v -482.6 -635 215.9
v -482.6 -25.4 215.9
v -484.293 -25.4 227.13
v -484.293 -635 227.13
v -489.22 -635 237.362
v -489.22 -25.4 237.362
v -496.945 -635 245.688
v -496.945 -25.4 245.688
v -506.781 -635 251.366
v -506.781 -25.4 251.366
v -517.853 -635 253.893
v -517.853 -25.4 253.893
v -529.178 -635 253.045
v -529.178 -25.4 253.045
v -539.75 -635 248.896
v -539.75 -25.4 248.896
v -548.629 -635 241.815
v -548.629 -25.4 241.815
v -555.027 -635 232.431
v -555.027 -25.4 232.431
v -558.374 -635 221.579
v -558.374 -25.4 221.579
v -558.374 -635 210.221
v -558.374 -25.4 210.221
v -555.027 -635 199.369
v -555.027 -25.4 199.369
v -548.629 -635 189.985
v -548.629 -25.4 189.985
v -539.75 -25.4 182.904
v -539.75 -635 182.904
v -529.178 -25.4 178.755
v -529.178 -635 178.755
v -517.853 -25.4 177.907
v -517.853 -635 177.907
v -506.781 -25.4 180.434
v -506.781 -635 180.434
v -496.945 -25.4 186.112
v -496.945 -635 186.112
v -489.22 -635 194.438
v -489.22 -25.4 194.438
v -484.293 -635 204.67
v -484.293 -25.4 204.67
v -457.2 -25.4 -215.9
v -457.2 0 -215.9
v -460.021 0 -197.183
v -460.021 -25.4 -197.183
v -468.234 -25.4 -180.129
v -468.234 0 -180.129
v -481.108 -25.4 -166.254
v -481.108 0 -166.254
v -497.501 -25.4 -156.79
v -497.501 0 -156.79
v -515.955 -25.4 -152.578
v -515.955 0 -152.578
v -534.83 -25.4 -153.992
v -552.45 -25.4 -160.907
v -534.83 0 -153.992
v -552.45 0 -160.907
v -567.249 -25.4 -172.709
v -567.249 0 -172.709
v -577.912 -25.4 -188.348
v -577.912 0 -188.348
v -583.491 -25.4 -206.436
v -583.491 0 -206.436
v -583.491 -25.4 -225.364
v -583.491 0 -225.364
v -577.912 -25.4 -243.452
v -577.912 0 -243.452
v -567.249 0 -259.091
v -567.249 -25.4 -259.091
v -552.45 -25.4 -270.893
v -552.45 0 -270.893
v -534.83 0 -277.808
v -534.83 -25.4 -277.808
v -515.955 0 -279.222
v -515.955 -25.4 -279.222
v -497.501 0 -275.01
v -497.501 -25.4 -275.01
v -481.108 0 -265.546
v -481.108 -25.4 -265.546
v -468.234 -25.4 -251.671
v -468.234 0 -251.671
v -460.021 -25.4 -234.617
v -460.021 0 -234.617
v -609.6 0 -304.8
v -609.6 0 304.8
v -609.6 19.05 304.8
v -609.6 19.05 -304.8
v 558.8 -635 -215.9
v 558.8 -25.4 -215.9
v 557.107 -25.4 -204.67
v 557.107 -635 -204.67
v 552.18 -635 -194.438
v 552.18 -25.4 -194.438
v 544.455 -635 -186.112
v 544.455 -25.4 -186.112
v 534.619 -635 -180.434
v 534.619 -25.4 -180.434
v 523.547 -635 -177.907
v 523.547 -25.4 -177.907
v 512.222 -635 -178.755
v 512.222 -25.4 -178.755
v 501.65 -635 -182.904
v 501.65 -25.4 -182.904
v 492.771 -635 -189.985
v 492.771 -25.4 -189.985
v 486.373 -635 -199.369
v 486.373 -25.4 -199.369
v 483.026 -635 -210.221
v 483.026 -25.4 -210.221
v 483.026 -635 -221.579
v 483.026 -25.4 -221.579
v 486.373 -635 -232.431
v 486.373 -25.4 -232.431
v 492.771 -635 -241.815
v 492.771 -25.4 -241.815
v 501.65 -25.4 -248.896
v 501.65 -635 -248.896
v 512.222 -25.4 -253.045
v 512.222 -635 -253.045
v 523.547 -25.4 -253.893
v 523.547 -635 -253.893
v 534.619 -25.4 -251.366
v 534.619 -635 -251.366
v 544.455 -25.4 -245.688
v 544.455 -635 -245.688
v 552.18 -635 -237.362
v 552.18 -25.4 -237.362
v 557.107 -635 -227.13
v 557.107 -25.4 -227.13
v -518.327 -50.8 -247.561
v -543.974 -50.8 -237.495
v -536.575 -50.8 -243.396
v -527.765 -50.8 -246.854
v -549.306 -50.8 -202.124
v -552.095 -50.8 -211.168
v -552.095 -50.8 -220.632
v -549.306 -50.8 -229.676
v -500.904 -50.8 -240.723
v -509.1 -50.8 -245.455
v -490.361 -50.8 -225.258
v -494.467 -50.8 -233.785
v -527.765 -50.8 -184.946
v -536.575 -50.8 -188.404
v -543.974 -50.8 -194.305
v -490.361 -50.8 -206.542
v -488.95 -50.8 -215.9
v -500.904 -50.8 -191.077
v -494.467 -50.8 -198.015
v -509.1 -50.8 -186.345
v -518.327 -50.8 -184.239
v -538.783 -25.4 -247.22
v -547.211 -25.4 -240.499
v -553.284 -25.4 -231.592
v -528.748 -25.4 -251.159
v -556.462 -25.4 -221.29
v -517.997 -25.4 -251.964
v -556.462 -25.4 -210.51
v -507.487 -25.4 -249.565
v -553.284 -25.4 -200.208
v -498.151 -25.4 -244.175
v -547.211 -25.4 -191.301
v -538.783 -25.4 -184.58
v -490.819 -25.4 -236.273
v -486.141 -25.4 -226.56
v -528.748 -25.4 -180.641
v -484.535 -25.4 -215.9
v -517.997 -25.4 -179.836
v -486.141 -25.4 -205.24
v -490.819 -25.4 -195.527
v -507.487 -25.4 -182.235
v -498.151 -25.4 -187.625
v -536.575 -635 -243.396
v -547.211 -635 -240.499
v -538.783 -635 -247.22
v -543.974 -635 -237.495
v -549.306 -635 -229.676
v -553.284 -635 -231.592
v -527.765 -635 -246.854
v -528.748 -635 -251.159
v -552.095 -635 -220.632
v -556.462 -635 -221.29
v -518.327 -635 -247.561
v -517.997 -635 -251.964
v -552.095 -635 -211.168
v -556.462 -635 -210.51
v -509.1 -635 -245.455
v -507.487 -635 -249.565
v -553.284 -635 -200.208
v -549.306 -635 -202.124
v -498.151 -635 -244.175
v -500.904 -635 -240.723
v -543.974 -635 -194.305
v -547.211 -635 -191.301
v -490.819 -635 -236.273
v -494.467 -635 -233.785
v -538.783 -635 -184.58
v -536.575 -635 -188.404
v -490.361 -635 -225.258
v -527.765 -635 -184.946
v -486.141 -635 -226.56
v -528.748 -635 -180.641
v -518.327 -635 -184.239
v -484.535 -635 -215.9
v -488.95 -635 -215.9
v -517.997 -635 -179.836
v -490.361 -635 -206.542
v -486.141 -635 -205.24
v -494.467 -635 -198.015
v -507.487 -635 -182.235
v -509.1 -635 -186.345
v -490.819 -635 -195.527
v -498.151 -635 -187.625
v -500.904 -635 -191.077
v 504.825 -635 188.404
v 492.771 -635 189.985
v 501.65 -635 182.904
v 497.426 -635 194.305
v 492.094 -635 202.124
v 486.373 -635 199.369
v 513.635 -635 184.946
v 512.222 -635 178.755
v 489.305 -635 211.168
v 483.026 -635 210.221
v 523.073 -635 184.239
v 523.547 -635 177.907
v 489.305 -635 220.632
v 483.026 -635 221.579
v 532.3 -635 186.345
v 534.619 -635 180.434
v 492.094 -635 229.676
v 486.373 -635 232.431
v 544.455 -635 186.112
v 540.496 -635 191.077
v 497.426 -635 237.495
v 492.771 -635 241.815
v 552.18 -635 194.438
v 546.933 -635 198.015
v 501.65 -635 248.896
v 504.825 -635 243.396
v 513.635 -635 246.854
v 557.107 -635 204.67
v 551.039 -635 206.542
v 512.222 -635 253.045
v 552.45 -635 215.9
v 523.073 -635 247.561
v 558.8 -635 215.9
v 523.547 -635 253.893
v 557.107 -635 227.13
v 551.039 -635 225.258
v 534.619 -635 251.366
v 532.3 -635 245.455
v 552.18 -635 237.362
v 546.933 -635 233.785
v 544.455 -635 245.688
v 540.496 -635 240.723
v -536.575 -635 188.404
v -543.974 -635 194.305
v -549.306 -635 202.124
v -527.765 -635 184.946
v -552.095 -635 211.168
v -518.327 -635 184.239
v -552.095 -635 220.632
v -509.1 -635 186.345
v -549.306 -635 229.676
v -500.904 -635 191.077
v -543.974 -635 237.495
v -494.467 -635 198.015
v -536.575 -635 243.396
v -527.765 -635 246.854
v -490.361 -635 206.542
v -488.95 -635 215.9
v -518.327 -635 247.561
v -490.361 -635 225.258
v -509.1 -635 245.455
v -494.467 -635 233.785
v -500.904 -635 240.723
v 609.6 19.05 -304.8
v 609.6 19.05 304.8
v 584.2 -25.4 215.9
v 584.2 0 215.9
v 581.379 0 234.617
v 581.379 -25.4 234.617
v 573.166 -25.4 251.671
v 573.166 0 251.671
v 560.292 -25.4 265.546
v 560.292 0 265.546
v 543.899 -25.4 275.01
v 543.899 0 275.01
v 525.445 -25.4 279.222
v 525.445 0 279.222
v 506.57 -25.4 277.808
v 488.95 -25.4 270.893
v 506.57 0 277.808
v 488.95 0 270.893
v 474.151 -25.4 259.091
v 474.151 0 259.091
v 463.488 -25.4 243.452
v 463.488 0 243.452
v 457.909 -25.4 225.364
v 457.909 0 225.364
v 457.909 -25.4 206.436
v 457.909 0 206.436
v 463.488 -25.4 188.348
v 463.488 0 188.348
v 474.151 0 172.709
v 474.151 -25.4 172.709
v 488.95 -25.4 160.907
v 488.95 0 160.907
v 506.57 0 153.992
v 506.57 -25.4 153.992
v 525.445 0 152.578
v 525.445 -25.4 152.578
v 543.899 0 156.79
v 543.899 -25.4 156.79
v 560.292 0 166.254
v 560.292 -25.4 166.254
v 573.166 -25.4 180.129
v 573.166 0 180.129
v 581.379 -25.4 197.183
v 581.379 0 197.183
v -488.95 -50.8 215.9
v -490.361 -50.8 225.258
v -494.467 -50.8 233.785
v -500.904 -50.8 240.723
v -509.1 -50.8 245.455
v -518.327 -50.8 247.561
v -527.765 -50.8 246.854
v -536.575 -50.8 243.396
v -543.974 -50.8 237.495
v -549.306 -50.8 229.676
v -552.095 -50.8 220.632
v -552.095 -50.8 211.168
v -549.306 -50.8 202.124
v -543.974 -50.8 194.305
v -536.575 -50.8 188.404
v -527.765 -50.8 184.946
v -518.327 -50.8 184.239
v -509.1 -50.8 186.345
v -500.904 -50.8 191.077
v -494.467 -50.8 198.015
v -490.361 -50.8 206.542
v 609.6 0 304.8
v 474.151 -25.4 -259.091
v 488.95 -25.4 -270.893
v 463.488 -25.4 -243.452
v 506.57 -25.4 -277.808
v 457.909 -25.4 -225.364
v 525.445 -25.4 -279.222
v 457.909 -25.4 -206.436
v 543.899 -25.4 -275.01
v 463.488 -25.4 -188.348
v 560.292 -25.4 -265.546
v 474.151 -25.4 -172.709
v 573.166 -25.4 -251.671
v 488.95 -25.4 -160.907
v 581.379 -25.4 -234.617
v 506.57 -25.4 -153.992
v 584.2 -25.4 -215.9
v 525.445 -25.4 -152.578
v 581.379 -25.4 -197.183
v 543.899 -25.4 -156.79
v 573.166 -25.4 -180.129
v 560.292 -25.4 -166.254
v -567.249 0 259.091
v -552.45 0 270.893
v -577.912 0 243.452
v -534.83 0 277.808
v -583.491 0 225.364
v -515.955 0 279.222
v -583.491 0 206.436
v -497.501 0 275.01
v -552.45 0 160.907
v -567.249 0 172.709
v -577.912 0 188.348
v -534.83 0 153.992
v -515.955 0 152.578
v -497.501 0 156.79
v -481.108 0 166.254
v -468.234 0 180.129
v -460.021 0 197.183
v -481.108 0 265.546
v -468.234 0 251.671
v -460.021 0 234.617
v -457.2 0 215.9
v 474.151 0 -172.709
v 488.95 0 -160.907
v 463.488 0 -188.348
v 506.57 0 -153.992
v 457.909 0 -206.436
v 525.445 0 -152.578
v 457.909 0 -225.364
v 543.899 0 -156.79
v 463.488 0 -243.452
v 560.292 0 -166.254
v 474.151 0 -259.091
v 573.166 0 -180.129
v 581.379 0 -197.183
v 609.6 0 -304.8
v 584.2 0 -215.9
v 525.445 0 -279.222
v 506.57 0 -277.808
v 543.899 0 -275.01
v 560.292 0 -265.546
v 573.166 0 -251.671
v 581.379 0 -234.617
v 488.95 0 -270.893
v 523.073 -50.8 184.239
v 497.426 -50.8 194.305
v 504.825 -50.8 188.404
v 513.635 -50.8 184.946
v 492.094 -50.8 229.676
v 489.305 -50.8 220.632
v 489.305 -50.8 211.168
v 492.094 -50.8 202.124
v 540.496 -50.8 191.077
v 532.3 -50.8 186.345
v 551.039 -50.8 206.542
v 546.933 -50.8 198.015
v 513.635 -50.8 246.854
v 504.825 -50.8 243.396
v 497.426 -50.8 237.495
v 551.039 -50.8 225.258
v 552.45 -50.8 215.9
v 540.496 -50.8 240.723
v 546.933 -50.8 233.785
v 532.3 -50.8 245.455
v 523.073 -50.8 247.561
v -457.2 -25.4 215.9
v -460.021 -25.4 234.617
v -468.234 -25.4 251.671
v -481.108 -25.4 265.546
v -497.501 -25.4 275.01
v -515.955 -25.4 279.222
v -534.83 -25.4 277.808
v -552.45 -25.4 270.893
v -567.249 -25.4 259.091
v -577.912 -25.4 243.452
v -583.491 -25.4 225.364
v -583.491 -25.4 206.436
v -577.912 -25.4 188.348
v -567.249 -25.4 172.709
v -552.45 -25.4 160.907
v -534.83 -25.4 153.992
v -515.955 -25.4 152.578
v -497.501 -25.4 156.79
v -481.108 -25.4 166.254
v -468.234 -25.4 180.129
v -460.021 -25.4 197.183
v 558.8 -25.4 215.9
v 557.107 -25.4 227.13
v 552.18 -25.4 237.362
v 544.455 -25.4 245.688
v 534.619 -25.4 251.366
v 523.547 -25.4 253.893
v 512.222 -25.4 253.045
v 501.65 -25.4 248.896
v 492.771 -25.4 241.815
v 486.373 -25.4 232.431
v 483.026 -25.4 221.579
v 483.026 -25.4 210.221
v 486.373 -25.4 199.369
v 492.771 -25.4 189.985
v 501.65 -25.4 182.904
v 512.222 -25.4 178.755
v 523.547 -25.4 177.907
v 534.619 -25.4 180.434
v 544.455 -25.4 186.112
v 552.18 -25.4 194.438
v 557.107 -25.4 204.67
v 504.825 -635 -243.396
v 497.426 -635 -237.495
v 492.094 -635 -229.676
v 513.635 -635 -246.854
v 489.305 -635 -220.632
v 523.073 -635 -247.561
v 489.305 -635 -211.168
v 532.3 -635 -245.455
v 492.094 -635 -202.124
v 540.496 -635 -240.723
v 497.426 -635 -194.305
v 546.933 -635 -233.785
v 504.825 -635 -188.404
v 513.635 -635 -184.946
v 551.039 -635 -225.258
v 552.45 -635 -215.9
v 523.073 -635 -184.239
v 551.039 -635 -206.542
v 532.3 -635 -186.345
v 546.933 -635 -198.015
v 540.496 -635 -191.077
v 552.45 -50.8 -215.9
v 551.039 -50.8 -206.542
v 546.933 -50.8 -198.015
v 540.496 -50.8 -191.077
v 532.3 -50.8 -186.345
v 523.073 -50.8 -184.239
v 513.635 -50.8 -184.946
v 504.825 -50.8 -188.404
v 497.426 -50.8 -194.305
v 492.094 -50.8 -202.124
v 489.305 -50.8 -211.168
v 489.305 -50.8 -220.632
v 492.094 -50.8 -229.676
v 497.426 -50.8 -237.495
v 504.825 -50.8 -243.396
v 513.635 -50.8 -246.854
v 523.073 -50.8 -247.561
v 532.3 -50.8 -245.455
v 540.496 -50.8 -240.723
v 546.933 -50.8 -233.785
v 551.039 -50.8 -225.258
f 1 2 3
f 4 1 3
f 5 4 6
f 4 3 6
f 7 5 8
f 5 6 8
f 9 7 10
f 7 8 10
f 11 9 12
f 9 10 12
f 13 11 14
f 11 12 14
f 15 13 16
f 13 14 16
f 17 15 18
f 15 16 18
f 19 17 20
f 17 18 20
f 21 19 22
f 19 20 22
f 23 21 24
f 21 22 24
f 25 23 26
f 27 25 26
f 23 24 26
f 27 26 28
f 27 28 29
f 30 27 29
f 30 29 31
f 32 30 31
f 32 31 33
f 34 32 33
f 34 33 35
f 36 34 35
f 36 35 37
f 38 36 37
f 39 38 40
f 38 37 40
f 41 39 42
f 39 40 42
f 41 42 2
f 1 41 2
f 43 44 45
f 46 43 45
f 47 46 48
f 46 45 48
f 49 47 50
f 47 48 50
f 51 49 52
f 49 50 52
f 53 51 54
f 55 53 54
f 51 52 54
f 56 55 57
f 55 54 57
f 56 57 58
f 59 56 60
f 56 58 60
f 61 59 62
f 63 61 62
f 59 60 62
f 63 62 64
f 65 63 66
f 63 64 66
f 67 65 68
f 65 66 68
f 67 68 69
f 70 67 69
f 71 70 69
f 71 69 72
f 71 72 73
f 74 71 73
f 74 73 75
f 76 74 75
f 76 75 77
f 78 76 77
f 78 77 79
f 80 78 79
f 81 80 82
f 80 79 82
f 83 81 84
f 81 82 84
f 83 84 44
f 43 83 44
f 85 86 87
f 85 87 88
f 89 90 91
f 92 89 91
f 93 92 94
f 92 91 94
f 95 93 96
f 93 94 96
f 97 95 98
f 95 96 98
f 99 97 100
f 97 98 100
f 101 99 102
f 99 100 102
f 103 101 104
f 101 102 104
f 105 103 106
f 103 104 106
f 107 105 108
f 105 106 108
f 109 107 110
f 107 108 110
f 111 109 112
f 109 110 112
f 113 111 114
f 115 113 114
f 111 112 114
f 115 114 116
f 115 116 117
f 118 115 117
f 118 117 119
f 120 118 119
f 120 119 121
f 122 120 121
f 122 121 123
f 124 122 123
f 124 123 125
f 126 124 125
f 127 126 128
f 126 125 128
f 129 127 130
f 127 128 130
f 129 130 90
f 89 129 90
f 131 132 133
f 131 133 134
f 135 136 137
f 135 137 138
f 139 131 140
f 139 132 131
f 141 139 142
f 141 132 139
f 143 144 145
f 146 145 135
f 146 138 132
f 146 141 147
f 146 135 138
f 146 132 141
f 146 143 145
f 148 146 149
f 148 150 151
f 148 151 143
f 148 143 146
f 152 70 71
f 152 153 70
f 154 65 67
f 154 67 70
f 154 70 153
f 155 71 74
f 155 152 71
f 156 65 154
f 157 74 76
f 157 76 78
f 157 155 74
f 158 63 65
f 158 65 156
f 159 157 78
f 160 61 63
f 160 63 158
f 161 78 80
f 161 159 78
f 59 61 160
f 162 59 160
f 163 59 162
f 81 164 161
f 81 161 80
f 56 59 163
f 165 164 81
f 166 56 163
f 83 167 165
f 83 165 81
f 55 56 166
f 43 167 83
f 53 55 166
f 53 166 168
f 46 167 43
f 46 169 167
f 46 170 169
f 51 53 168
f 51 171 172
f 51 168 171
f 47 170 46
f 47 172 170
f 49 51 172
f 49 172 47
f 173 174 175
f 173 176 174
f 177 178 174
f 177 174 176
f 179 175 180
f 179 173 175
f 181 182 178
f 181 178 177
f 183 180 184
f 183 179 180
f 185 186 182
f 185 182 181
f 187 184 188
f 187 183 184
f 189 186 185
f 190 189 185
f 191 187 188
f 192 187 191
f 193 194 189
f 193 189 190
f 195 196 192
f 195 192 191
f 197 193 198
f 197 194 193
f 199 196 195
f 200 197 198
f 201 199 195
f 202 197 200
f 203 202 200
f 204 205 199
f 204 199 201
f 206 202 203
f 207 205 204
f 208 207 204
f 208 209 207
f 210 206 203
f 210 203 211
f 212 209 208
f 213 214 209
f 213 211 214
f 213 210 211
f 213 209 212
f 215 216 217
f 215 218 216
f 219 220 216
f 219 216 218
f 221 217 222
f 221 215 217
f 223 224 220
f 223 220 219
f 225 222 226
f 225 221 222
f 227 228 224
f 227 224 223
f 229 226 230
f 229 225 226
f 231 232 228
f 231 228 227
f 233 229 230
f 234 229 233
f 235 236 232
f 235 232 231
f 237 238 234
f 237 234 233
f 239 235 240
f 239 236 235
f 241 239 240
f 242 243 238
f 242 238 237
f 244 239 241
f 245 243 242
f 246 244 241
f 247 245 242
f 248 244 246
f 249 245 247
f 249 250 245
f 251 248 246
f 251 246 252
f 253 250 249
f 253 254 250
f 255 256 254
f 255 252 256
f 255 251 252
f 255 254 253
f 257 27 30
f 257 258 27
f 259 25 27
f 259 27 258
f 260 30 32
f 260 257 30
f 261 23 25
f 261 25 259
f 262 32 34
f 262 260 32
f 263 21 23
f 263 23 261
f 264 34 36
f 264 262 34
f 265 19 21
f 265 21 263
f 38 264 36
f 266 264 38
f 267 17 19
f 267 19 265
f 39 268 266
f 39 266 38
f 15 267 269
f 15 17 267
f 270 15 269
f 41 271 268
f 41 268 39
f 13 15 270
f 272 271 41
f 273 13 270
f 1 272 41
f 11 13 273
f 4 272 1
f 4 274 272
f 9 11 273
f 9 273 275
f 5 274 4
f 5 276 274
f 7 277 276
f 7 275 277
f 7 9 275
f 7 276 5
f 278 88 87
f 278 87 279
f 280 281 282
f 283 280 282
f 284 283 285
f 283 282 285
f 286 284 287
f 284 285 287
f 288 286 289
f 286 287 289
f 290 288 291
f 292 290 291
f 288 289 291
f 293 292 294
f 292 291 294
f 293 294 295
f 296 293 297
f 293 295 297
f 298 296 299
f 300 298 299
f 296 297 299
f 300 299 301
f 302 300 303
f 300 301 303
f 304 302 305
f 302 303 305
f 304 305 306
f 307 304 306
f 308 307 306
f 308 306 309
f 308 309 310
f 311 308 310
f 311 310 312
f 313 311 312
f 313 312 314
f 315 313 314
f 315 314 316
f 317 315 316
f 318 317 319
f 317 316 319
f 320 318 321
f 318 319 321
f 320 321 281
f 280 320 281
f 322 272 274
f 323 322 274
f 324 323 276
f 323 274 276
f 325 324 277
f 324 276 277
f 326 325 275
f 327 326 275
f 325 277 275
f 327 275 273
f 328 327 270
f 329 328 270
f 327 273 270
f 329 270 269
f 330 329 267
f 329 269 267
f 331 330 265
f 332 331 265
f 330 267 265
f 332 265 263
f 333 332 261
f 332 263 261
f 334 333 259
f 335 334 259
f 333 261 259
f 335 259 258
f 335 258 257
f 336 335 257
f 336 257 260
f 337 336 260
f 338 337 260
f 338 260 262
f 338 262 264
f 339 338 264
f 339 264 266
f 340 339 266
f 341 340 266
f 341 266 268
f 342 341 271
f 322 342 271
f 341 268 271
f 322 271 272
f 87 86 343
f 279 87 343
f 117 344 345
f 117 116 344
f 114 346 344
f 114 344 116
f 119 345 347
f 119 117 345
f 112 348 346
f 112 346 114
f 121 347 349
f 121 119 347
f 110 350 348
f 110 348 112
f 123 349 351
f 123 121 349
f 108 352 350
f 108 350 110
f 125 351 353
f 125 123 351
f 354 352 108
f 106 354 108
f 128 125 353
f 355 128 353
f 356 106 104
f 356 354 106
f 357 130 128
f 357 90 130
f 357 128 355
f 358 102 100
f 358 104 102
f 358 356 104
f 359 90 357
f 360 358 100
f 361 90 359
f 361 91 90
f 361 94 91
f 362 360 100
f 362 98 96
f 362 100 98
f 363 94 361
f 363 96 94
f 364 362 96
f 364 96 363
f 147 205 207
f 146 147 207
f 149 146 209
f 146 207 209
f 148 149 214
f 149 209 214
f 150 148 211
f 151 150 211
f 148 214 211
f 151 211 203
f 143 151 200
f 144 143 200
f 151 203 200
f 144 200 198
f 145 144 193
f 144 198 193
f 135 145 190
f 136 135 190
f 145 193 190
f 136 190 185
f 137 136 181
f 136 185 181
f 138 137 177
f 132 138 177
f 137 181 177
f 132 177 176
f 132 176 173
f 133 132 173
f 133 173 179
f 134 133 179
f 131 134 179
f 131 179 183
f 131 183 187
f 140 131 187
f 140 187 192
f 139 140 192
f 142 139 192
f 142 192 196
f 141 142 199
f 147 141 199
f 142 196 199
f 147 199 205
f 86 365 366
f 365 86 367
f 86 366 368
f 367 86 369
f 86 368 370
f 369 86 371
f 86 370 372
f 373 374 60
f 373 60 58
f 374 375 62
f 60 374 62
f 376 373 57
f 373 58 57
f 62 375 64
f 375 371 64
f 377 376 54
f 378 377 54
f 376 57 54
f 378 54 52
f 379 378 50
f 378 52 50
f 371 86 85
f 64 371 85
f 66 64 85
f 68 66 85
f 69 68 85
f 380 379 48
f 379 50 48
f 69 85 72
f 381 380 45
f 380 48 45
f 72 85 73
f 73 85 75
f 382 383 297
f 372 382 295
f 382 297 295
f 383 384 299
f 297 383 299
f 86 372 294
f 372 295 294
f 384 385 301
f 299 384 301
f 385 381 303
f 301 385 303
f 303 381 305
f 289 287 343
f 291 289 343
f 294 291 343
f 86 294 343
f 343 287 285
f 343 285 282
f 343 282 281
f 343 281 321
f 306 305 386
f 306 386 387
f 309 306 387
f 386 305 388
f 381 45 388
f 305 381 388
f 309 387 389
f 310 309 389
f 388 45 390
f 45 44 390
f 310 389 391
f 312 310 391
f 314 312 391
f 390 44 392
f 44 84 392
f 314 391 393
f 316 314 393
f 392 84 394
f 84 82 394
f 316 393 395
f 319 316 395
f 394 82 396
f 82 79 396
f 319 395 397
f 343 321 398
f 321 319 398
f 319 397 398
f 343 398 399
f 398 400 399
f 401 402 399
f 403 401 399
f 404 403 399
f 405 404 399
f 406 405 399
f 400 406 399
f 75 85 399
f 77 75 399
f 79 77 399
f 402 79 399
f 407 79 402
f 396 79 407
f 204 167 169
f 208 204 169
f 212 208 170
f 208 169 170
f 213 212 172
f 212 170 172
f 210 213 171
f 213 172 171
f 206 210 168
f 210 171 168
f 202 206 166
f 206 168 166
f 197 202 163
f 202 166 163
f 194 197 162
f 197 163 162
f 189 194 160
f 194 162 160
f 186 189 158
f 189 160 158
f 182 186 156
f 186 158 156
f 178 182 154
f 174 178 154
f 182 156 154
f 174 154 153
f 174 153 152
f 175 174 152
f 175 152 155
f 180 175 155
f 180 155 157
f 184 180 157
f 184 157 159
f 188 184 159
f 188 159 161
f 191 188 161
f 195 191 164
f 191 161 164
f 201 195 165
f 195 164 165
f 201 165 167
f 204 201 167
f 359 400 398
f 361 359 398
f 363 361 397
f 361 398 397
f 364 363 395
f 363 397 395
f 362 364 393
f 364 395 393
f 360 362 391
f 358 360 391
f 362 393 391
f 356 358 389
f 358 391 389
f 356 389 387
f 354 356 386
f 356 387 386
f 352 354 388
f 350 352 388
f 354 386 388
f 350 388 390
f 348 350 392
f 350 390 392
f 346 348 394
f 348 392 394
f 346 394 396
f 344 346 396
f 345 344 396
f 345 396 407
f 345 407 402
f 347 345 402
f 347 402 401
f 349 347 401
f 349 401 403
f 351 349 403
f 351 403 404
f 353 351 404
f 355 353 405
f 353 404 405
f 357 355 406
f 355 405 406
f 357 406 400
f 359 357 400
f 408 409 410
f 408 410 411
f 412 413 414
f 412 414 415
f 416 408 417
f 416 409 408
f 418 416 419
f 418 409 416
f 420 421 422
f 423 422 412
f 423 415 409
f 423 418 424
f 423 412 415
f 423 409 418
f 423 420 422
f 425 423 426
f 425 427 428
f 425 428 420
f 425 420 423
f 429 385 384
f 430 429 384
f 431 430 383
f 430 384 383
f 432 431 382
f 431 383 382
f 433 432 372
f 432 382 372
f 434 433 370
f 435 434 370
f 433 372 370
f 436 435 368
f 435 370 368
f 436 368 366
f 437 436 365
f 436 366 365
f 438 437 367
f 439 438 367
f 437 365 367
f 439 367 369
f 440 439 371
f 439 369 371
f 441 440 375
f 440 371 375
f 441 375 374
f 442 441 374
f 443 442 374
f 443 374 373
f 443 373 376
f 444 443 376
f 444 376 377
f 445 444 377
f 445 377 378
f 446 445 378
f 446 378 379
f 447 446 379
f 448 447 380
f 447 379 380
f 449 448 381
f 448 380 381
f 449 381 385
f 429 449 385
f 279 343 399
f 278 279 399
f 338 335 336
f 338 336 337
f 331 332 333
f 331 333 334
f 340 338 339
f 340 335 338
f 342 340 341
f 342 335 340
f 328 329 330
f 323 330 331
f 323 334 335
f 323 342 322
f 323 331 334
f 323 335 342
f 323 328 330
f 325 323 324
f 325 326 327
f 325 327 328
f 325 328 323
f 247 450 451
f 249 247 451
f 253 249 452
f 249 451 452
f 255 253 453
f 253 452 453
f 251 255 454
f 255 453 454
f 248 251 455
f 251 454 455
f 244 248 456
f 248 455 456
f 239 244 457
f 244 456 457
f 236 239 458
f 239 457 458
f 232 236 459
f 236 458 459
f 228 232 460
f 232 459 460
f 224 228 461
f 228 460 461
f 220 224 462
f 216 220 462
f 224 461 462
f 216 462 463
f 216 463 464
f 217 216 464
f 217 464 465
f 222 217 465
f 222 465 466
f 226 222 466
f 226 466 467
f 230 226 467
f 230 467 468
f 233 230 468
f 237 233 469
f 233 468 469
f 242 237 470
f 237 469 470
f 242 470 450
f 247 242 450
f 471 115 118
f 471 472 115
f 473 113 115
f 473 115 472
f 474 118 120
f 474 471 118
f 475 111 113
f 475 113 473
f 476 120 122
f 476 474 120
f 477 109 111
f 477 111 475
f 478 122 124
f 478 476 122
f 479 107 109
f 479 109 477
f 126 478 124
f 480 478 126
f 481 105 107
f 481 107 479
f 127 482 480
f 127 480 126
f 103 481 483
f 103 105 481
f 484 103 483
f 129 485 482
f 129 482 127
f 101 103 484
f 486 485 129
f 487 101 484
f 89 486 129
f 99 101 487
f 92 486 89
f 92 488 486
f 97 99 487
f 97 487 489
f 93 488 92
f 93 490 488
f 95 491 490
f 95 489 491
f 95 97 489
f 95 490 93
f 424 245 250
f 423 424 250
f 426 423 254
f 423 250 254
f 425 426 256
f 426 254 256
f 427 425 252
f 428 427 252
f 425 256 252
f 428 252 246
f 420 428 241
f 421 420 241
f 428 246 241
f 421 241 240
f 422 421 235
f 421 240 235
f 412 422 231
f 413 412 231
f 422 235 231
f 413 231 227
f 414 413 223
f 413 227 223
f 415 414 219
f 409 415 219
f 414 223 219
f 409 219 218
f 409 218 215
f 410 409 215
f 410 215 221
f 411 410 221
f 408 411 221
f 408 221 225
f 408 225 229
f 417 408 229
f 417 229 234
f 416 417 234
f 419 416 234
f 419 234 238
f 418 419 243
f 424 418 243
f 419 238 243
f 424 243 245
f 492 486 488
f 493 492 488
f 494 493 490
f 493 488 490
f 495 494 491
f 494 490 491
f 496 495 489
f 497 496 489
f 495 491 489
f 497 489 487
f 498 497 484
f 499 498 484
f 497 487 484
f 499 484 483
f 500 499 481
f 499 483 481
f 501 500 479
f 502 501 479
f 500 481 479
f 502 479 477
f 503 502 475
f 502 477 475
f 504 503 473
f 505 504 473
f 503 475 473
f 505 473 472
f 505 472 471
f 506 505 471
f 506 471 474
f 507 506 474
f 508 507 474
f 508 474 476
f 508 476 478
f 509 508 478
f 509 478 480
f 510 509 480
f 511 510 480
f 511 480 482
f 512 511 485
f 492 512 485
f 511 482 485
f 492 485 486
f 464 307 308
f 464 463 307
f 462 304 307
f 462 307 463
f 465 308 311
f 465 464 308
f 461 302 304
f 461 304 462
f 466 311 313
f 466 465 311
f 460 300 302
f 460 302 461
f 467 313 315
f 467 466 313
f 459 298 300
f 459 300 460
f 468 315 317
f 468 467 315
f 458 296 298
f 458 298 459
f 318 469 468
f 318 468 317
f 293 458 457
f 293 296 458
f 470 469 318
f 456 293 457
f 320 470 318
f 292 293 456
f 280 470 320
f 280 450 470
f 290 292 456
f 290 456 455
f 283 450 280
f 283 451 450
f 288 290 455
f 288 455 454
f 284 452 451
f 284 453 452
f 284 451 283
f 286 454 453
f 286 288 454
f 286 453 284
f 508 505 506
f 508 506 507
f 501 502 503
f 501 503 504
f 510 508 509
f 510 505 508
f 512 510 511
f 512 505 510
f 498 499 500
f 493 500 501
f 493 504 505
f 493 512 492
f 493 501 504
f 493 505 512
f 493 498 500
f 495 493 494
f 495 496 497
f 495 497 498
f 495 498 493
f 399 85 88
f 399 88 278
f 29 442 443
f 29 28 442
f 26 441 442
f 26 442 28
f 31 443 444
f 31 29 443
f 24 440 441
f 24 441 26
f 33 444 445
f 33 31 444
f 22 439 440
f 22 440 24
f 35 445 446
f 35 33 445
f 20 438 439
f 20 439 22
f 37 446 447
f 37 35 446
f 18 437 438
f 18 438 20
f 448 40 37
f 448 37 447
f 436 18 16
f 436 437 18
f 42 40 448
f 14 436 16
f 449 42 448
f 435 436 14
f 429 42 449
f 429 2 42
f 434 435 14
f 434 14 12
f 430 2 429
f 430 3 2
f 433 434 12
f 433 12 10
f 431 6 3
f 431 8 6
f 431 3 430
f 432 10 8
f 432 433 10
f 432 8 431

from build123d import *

# Parameters (mm, degrees)
SKETCH1_W           = 1219.2
SKETCH1_H           = 609.6
BOSS_EXTRUDE1_DEPTH = 19.05
SKETCH2_R           = 63.5
BOSS_EXTRUDE2_DEPTH = 25.4
SKETCH3_R           = 38.1
SKETCH3_R_2         = 36.165456998
BOSS_EXTRUDE3_DEPTH = 609.6
SKETCH4_R           = 31.75
CUT_EXTRUDE1_DEPTH  = 584.2


with BuildPart() as part:
    # Sketch1 → Boss-Extrude1 (new body)
    with BuildSketch(Plane(origin=(0, 0, 0), x_dir=(1, 0, 0), z_dir=(0, 1, 0))):
        Rectangle(SKETCH1_W, SKETCH1_H)
    extrude(amount=BOSS_EXTRUDE1_DEPTH)

    # Sketch2 → Boss-Extrude2 (add)
    with BuildSketch(Plane.XZ):
        with Locations((-520.7, 215.9)):
            Circle(SKETCH2_R)
        with Locations((-520.7, -215.9)):
            Circle(SKETCH2_R)
        with Locations((520.7, 215.9)):
            Circle(SKETCH2_R)
        with Locations((520.7, -215.9)):
            Circle(SKETCH2_R)
    extrude(amount=BOSS_EXTRUDE2_DEPTH)

    # Sketch3 → Boss-Extrude3 (add)
    with BuildSketch(Plane.XZ.offset(25.4)):
        with Locations((-520.7, 215.9)):
            Circle(SKETCH3_R)
        with Locations((-520.7, -215.9)):
            Circle(SKETCH3_R_2)
        with Locations((520.7, 215.9)):
            Circle(SKETCH3_R)
        with Locations((520.7, -215.9)):
            Circle(SKETCH3_R)
    extrude(amount=BOSS_EXTRUDE3_DEPTH)

    # Sketch4 → Cut-Extrude1 (cut)
    with BuildSketch(Plane.XZ.offset(635)):
        with Locations((-520.7, 215.9)):
            Circle(SKETCH4_R)
        with Locations((520.7, 215.9)):
            Circle(SKETCH4_R)
        with Locations((520.7, -215.9)):
            Circle(SKETCH4_R)
        with Locations((-520.7, -215.9)):
            Circle(SKETCH4_R)
    extrude(amount=-CUT_EXTRUDE1_DEPTH, mode=Mode.SUBTRACT)


solid = part.part
